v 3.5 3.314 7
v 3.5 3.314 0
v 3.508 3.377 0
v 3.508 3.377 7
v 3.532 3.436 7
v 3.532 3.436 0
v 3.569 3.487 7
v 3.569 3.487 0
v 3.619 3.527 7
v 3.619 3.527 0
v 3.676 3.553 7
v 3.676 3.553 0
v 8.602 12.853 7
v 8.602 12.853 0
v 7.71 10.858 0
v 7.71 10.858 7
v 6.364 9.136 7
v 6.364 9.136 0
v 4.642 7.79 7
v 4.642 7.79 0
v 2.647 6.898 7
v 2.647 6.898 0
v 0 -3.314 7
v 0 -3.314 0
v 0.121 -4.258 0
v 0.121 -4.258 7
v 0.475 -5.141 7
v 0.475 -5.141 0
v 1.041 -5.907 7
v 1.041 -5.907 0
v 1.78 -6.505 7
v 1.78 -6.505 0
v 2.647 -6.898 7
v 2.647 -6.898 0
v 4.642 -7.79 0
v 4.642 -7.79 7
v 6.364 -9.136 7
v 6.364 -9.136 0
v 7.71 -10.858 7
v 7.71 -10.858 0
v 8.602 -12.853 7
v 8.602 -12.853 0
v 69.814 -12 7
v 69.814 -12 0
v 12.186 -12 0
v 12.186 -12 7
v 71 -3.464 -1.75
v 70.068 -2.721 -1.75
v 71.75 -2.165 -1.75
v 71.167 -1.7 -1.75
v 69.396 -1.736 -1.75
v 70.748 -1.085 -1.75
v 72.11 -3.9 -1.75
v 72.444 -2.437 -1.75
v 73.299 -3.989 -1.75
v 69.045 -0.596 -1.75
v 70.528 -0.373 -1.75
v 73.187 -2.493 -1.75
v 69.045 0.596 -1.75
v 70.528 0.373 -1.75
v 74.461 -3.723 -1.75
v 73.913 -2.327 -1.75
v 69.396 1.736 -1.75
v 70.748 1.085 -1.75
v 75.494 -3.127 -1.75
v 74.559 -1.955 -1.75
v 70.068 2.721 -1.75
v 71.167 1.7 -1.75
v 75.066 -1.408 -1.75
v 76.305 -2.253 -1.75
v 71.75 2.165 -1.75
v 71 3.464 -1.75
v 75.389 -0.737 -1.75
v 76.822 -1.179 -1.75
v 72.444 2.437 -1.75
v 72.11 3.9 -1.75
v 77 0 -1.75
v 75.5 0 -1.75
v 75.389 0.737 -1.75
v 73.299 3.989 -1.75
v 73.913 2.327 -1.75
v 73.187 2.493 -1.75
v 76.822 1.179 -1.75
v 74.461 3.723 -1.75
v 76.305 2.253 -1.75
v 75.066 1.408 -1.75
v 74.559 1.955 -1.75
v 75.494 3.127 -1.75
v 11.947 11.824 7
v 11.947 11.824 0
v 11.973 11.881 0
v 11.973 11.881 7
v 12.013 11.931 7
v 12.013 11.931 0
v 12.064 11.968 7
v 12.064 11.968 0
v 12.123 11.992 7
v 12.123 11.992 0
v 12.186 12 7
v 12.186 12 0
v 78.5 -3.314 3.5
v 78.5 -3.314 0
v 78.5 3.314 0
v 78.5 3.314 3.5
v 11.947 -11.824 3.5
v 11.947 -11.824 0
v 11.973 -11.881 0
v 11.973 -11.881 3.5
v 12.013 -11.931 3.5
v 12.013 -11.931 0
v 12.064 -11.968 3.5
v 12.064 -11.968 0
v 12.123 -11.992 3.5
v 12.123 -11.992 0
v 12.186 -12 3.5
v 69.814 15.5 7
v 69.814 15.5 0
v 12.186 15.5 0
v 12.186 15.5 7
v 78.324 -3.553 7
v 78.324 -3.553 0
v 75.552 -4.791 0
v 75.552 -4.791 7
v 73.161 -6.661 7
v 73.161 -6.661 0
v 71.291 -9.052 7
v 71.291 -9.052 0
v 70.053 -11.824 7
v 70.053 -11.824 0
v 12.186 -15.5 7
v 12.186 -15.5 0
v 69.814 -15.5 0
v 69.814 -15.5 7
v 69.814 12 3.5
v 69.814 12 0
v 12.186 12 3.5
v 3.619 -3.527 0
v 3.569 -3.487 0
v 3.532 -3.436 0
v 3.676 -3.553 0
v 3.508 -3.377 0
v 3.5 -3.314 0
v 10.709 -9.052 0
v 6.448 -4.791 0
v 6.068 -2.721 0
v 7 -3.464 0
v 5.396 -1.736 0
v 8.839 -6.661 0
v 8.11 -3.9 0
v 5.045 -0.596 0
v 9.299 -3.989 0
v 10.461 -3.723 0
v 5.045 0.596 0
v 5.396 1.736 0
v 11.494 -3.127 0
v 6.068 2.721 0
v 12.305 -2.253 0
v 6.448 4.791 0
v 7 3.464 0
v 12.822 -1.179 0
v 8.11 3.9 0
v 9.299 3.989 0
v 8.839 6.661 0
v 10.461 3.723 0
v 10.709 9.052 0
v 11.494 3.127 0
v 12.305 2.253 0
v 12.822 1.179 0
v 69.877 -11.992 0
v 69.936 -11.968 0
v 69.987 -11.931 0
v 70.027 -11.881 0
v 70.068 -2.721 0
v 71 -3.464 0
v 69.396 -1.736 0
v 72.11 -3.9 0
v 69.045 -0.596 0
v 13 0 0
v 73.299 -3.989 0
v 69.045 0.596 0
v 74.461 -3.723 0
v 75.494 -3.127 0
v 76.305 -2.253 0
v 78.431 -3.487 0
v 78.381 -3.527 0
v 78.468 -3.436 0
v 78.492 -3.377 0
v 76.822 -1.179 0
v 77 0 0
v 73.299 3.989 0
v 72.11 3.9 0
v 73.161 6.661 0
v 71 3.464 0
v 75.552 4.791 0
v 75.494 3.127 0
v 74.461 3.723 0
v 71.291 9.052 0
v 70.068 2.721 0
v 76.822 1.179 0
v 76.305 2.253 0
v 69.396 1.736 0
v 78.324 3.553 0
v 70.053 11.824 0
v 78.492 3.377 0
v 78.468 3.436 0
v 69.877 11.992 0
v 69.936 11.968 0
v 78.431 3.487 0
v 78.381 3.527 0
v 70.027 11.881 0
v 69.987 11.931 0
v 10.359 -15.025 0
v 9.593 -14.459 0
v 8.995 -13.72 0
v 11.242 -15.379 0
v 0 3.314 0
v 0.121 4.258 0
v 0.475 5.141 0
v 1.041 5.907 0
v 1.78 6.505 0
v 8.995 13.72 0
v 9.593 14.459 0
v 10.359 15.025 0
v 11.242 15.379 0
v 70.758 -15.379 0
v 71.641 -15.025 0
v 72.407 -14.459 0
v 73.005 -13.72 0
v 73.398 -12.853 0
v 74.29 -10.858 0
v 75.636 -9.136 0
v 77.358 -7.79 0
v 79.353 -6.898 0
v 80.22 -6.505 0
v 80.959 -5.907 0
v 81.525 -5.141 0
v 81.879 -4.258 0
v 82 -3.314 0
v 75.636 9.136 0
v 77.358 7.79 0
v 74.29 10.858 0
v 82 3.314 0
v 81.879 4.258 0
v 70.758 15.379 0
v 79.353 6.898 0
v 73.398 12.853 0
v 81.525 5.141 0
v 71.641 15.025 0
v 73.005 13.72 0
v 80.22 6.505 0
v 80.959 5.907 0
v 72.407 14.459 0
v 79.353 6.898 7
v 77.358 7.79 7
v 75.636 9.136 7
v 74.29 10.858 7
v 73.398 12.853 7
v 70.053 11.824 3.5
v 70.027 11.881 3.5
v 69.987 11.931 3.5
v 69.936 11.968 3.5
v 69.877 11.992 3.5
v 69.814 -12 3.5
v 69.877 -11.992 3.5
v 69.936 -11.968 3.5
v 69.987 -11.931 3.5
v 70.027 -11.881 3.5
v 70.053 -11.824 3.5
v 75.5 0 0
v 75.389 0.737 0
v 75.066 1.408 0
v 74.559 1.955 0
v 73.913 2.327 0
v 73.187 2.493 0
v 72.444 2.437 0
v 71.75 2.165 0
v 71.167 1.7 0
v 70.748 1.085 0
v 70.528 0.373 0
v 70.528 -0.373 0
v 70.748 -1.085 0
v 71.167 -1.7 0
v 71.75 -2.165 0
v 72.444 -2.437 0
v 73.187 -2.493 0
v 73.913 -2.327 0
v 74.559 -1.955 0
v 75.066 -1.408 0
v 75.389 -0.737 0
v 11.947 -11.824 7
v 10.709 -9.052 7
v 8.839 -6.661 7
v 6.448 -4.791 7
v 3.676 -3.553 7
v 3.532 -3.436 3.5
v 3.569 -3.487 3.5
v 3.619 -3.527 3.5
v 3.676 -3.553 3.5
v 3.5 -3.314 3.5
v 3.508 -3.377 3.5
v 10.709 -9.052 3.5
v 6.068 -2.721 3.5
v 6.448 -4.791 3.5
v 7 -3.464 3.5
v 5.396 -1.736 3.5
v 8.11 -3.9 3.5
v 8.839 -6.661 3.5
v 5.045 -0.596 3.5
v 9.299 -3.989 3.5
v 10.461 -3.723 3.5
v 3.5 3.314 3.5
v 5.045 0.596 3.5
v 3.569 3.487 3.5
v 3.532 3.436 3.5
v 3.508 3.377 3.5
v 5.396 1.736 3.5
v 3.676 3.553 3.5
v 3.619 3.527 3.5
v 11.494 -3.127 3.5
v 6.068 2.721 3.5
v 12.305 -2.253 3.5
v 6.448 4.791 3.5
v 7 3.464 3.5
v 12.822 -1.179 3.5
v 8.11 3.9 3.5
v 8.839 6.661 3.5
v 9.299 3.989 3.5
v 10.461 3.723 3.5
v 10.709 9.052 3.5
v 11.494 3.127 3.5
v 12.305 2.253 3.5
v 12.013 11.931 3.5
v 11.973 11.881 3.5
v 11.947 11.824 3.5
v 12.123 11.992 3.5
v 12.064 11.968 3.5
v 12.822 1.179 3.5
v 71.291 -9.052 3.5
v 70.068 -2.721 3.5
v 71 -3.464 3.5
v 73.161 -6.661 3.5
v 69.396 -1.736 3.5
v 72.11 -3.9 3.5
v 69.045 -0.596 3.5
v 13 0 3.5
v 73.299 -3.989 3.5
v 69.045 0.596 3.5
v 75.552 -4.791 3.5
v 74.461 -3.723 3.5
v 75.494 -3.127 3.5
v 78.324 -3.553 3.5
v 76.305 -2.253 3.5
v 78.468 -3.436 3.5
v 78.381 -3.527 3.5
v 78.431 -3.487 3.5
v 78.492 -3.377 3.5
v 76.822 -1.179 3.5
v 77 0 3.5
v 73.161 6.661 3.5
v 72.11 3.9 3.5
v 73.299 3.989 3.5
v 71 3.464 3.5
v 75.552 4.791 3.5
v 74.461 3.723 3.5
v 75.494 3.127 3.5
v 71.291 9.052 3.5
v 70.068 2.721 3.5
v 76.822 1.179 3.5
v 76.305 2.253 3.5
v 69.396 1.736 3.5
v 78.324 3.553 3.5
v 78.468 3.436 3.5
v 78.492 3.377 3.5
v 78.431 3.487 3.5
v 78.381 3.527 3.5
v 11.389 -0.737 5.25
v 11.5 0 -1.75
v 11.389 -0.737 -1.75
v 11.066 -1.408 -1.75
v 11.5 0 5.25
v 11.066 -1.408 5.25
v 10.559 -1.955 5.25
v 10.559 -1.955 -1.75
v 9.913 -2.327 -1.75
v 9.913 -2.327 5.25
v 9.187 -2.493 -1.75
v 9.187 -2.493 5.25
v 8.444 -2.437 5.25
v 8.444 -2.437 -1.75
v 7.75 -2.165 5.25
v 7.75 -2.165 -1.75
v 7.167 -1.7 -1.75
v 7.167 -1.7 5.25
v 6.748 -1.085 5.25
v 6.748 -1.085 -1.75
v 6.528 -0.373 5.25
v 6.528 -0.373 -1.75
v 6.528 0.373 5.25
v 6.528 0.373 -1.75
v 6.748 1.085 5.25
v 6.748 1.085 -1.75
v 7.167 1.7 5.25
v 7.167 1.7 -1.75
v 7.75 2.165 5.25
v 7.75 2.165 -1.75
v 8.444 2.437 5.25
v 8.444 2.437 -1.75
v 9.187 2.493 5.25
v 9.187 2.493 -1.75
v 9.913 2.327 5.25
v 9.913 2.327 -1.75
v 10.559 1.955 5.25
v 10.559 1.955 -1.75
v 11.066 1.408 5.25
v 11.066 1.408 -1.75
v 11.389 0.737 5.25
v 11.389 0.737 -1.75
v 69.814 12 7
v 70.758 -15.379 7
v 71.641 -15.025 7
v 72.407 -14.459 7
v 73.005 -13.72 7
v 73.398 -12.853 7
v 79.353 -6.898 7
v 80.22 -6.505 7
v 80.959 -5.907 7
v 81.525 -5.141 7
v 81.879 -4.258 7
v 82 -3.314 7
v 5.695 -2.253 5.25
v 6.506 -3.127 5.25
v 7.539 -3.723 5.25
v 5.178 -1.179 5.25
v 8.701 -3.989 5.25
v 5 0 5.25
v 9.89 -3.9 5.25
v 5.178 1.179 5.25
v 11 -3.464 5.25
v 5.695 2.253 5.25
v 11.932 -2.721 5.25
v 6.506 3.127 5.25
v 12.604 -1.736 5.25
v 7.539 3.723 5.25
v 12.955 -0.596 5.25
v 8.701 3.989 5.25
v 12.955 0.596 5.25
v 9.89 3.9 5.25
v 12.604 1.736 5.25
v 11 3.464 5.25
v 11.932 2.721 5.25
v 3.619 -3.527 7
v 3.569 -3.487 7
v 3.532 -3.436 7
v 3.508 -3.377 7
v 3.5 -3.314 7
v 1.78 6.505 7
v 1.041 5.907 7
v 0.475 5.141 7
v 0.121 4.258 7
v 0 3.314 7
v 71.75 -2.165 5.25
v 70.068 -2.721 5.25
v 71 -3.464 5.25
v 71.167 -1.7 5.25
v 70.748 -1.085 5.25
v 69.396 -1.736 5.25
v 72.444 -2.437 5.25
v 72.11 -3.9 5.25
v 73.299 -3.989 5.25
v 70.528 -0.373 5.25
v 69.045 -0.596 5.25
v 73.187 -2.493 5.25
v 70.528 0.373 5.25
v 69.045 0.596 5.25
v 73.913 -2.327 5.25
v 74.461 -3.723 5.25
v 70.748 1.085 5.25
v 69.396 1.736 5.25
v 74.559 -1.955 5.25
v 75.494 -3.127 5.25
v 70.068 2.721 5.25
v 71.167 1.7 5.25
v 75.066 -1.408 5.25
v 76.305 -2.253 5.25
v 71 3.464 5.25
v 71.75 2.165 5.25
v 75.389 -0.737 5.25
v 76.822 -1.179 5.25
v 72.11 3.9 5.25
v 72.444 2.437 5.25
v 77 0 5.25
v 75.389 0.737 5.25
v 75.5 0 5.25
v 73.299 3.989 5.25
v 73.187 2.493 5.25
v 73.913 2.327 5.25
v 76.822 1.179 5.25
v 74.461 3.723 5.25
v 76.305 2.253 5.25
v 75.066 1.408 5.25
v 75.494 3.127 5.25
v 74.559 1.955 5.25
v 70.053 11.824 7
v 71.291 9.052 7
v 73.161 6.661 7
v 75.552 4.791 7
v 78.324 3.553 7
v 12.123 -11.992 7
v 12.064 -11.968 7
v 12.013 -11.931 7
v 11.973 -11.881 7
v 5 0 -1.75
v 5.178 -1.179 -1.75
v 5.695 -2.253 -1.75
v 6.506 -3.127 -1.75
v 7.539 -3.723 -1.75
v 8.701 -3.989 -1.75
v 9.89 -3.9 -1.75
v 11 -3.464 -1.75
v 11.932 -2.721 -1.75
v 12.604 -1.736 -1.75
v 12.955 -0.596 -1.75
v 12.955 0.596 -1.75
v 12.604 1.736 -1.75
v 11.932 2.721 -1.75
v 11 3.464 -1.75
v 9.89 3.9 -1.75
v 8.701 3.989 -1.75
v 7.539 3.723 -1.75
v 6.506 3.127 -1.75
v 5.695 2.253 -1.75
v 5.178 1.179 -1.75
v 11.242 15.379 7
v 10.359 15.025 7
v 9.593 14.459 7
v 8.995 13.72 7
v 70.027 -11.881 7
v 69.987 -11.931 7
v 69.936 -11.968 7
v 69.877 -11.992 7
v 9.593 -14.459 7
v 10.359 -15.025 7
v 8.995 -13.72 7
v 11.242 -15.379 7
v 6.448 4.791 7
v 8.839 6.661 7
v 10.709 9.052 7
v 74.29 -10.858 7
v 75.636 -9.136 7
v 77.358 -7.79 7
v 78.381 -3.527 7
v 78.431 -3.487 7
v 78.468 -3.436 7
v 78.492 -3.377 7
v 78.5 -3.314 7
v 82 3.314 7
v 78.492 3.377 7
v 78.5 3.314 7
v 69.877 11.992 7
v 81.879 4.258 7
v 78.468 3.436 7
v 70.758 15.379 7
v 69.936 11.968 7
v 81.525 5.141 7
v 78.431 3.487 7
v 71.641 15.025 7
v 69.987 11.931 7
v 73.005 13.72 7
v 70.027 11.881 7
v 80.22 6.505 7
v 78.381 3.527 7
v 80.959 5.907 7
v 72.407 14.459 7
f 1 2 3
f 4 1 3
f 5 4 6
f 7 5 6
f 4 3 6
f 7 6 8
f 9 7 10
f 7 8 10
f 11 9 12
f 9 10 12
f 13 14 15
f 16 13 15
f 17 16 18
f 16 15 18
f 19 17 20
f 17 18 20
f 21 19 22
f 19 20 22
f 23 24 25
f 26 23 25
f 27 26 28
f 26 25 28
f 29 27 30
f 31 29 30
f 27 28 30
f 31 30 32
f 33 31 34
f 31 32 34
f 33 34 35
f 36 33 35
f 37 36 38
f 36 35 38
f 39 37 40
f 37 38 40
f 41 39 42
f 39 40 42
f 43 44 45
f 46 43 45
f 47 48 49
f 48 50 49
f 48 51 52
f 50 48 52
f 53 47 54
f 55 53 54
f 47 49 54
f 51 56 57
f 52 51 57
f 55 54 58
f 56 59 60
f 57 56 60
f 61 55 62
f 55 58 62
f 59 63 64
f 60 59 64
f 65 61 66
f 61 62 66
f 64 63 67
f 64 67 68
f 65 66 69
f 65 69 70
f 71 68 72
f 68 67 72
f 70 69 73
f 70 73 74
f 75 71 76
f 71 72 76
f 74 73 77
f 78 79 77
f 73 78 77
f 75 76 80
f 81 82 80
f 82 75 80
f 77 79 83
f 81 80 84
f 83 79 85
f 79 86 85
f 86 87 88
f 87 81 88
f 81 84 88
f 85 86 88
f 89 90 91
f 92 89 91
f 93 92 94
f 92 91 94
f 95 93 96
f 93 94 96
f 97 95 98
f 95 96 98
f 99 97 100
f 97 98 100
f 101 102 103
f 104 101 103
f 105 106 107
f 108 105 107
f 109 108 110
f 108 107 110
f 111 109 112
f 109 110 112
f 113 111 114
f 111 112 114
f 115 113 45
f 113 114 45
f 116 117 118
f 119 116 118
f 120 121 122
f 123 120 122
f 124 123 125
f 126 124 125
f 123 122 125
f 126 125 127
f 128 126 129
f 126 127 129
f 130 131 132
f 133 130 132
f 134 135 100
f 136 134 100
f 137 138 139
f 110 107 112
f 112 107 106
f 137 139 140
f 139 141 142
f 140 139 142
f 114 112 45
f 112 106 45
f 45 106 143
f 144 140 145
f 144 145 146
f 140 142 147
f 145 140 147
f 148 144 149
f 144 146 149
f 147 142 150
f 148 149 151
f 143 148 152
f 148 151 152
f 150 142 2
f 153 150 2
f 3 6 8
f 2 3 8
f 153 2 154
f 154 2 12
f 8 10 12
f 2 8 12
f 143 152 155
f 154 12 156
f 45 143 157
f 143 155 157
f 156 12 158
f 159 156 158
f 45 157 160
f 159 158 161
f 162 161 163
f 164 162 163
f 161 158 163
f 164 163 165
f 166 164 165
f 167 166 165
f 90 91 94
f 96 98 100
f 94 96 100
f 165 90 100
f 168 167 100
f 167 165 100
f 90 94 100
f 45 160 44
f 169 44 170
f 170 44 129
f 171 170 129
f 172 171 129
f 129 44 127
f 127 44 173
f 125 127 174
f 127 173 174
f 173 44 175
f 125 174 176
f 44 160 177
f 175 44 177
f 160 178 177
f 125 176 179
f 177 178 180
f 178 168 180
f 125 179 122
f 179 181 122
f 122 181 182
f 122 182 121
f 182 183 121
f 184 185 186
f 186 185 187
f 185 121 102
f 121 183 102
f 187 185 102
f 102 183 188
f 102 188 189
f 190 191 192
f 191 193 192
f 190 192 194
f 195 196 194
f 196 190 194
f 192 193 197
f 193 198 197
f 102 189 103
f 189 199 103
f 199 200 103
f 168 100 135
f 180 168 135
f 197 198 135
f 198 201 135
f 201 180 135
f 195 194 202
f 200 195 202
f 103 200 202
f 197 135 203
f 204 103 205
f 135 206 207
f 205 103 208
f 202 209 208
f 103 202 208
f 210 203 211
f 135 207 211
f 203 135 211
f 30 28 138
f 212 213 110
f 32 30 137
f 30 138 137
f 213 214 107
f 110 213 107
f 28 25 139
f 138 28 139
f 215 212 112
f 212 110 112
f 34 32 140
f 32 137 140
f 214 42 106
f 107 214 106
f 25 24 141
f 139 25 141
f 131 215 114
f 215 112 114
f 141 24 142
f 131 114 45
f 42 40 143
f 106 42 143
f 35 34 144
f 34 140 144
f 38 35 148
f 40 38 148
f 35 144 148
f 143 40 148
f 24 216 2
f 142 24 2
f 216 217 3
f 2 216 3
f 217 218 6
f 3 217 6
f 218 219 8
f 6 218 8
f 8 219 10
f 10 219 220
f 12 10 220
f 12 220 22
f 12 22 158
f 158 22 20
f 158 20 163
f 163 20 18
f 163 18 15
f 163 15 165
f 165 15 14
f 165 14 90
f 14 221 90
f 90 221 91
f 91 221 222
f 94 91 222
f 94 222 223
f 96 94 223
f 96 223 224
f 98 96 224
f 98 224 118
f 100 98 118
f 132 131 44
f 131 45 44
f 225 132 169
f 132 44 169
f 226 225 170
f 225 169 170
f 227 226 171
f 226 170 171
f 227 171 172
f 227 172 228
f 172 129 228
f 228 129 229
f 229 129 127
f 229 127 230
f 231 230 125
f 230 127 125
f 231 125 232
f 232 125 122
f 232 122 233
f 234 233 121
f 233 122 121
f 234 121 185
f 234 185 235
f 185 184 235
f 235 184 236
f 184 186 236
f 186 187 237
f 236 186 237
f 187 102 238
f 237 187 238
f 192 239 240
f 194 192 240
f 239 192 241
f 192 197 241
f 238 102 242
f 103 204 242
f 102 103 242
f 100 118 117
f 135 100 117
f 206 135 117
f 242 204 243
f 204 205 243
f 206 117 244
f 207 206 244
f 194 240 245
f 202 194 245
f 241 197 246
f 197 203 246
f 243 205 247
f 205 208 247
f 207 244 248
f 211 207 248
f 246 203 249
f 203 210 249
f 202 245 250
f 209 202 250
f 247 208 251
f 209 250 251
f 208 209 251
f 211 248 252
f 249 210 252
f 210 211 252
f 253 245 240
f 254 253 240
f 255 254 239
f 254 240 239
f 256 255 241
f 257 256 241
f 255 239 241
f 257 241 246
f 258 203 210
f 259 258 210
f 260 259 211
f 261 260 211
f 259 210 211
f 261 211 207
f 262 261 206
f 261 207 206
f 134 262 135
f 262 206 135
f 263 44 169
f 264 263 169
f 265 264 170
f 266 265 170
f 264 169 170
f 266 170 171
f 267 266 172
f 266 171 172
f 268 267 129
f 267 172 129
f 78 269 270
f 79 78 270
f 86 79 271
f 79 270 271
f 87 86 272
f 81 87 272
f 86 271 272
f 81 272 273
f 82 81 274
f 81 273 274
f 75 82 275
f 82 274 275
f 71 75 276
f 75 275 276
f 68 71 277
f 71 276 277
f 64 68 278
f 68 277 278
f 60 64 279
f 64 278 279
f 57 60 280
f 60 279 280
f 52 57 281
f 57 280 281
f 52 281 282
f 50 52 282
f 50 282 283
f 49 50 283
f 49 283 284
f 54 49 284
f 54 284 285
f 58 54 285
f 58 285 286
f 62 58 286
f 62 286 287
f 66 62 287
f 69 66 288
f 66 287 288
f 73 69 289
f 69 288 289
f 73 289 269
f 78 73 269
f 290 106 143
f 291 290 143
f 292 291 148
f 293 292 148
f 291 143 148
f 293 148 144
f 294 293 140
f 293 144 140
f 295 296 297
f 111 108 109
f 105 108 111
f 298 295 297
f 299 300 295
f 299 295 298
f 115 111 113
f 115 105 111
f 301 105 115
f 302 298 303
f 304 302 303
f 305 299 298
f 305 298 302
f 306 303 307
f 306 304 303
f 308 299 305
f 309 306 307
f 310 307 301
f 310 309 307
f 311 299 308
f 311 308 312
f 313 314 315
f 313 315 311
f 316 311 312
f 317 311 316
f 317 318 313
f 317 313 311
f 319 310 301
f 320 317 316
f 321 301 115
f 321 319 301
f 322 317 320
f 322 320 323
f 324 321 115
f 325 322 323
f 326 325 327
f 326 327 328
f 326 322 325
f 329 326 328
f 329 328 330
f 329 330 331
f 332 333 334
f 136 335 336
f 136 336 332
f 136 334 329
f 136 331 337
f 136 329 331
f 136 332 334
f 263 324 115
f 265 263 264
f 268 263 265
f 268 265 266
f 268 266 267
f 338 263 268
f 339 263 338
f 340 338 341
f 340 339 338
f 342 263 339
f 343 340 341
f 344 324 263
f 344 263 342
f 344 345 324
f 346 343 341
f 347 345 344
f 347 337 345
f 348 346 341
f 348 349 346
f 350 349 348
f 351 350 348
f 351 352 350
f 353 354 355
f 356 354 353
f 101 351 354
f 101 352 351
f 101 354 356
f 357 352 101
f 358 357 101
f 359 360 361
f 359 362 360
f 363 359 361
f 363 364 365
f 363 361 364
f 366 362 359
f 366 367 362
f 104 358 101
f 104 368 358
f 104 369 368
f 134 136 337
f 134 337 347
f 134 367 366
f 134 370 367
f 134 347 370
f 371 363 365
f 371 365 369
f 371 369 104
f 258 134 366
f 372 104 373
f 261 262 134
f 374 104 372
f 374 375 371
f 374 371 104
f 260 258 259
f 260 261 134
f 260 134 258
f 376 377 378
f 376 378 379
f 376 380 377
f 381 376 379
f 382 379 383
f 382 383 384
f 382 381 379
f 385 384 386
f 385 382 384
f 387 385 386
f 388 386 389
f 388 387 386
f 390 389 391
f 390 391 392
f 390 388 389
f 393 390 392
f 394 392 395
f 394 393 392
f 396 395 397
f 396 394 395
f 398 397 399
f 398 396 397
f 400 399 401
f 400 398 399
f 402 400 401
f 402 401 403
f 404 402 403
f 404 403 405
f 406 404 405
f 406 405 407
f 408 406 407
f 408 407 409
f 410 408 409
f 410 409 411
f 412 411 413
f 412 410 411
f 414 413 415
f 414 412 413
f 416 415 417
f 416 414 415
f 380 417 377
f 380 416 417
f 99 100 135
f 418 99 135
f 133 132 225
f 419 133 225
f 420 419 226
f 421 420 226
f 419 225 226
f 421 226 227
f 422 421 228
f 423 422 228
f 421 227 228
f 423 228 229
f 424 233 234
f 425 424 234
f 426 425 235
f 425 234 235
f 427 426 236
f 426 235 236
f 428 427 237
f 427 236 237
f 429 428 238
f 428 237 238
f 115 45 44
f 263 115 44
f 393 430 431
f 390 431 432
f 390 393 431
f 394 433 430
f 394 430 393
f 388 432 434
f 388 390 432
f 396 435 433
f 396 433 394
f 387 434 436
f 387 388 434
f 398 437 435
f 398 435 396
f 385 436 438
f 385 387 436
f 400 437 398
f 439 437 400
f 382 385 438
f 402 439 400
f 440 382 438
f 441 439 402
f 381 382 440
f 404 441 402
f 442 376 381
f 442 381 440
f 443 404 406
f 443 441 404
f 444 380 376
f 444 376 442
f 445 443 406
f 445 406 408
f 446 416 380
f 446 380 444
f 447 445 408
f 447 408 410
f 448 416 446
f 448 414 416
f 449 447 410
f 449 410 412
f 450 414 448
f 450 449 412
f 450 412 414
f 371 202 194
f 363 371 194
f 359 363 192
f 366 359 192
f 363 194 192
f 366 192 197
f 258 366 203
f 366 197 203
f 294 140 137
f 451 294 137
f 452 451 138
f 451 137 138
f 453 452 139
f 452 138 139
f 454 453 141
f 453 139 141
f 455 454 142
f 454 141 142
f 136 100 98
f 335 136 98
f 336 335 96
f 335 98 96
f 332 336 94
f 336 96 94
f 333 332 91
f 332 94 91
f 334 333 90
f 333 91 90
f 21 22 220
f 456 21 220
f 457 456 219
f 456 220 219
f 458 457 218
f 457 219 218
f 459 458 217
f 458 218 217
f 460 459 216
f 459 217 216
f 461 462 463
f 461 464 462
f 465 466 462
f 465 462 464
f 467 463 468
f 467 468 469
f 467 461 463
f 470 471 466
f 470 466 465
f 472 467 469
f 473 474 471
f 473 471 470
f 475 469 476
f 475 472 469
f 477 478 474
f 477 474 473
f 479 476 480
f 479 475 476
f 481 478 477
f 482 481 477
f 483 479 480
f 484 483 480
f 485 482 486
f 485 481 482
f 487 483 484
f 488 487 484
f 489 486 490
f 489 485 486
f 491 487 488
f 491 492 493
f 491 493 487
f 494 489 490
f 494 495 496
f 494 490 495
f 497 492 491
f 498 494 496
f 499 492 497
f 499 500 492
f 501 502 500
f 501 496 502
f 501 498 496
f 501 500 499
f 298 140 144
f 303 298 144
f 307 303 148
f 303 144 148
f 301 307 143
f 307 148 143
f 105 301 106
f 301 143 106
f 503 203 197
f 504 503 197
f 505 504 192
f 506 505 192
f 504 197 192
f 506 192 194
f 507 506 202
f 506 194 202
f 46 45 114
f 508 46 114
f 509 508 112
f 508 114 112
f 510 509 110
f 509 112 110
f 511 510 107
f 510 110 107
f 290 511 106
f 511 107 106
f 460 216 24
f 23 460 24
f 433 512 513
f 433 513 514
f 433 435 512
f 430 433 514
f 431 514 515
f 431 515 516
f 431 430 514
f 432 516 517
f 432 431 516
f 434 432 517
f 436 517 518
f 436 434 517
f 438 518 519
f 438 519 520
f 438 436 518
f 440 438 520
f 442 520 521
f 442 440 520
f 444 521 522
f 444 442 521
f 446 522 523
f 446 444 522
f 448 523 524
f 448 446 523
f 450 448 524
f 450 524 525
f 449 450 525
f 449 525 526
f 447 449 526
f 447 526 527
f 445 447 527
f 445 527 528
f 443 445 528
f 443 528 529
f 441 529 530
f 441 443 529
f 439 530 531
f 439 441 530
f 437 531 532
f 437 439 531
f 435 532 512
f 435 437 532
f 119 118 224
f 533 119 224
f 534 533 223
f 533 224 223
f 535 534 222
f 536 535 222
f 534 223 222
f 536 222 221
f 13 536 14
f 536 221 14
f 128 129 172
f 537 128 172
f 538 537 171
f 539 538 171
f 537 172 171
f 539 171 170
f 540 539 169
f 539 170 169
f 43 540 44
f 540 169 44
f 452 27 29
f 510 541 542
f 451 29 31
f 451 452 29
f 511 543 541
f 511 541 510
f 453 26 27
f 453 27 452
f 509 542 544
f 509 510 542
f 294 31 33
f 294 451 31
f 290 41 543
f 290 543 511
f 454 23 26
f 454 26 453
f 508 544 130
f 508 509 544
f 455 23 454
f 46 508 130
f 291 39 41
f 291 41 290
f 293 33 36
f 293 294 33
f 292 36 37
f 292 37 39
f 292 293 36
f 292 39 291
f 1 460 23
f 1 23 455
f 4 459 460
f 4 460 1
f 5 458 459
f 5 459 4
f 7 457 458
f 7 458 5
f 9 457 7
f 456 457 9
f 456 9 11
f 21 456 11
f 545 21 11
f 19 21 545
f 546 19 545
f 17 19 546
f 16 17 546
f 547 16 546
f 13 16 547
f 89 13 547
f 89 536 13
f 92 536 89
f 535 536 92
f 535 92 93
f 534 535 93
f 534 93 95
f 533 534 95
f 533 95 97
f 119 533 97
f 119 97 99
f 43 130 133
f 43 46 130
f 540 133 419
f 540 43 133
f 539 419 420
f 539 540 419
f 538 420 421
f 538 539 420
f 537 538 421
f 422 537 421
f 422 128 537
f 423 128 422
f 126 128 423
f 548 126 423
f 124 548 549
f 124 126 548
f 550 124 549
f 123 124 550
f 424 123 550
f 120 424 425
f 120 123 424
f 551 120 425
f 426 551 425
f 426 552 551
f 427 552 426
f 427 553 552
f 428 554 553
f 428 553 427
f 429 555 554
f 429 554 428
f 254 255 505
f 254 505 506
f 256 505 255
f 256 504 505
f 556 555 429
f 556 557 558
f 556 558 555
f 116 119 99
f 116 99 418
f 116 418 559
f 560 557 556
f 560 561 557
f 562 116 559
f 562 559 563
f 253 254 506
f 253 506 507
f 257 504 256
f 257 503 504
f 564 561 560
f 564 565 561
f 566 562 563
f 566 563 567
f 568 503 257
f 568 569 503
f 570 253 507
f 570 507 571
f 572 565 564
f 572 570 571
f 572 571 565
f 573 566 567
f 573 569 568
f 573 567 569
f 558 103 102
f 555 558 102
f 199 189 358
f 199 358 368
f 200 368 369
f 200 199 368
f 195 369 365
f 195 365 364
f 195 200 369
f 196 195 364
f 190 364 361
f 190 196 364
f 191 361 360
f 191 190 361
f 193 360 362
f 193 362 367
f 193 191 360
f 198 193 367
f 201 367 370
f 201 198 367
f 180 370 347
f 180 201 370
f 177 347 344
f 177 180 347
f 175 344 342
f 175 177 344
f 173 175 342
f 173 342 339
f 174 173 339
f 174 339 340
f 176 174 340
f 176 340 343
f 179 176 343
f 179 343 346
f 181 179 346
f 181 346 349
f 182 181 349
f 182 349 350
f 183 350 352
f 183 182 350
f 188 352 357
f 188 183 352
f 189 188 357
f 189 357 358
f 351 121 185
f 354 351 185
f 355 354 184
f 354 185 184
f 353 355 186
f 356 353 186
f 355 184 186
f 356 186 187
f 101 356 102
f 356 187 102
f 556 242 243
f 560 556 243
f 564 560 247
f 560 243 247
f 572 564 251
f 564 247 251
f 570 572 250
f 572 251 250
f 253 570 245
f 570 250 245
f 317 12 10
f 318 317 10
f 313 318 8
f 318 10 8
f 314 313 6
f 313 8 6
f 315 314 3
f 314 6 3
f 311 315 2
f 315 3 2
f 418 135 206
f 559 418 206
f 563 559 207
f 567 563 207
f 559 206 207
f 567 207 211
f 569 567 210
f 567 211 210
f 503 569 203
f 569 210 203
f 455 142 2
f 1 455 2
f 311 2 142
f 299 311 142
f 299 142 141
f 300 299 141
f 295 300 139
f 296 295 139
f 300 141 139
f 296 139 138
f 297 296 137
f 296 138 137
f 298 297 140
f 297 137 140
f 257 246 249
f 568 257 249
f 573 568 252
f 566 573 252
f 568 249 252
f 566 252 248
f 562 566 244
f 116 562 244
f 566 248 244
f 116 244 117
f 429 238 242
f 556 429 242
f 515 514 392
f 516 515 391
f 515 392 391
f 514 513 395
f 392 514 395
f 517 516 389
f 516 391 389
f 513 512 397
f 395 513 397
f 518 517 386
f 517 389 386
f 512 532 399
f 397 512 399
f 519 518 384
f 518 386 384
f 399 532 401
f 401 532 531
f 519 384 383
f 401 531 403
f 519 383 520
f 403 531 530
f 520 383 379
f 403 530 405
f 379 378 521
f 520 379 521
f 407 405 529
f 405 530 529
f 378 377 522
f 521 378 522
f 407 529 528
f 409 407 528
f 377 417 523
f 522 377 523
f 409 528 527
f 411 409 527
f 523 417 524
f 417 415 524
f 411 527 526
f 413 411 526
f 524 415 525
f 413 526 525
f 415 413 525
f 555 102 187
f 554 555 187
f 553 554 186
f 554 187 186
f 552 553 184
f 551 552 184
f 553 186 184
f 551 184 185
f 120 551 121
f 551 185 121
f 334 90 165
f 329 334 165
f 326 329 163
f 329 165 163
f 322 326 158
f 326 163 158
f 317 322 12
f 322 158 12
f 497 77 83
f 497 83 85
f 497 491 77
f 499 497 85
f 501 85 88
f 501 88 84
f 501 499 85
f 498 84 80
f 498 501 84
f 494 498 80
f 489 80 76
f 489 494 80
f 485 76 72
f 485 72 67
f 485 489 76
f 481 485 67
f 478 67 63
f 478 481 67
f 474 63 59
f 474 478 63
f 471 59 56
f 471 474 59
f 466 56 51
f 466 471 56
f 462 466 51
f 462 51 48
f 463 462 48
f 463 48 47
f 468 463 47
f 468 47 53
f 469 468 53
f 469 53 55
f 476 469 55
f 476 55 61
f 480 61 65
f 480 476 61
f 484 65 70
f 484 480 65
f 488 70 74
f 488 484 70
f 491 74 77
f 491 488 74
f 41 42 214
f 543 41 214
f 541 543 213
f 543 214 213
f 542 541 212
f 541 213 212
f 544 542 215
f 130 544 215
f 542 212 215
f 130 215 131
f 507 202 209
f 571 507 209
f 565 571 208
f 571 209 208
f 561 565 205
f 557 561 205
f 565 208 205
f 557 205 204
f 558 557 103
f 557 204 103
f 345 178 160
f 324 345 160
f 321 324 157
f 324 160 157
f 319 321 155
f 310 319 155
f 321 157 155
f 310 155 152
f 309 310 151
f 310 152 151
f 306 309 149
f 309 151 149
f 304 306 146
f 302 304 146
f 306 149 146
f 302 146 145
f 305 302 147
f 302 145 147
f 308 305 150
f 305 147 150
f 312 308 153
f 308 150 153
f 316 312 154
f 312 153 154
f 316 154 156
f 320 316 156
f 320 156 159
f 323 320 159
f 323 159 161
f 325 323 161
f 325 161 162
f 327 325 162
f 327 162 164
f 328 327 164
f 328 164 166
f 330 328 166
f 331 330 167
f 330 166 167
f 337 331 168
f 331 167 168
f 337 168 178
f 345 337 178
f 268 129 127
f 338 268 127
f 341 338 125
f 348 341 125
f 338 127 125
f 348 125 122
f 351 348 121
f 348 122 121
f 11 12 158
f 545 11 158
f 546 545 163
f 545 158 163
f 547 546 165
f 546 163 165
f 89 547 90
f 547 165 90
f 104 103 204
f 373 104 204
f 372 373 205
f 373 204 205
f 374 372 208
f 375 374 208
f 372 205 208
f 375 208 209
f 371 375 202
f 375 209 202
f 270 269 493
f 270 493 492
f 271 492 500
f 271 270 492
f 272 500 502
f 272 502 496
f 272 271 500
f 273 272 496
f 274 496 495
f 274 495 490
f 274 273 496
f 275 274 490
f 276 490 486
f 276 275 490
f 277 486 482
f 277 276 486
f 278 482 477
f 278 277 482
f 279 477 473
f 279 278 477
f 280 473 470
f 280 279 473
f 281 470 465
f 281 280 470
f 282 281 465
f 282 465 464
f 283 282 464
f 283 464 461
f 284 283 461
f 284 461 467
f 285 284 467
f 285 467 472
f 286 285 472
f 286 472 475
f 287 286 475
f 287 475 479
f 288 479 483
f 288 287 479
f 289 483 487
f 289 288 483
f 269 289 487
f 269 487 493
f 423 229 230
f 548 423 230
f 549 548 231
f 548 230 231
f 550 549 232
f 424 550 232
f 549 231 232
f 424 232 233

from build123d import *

# Parameters (mm, degrees)
BOSS_EXTRUDE3_DEPTH        = 5.25
BOSS_EXTRUDE3_DEPTH_BACK   = 1.75
SKETCH8_R                  = 4
SKETCH8_R_2                = 2.5
BOSS_EXTRUDE3_2_DEPTH      = 5.25
BOSS_EXTRUDE3_2_DEPTH_BACK = 1.75
SKETCH8_4_R                = 4
BOSS_EXTRUDE4_DEPTH        = 3.5
BOSS_EXTRUDE5_DEPTH        = 7


with BuildPart() as part:
    # Sketch8 → Boss-Extrude3 (new, two sides: drawn at the far end of the back side and taken through both)
    with BuildSketch(Plane.XY.offset(-BOSS_EXTRUDE3_DEPTH_BACK)):
        with Locations((9, 0)):
            Circle(SKETCH8_R)
        with Locations((9, 0)):
            Circle(SKETCH8_R_2, mode=Mode.SUBTRACT)
    extrude(amount=BOSS_EXTRUDE3_DEPTH + BOSS_EXTRUDE3_DEPTH_BACK)


with BuildPart() as body_2:
    # Sketch8 → Boss-Extrude3 2 (new, two sides: drawn at the far end of the back side and taken through both)
    with BuildSketch(Plane.XY.offset(-BOSS_EXTRUDE3_2_DEPTH_BACK)):
        with Locations((73, 0)):
            Circle(SKETCH8_R)
        with Locations((73, 0)):
            Circle(SKETCH8_R_2, mode=Mode.SUBTRACT)
    extrude(amount=BOSS_EXTRUDE3_2_DEPTH + BOSS_EXTRUDE3_2_DEPTH_BACK)


with BuildPart() as body_3:
    # Sketch8<4> → Boss-Extrude4 (new body)
    with BuildSketch(Plane.XY):
        with BuildLine():
            Line((3.5, 3.313942393), (3.5, -3.313942393))
            ThreePointArc((3.5, -3.313942393), (3.548900083, -3.462464524), (3.676470588, -3.552884699))
            ThreePointArc((3.676470588, -3.552884699), (8.838834765, -6.661165235), (11.947115301, -11.823529412))
            ThreePointArc((11.947115301, -11.823529412), (12.037535476, -11.951099917), (12.186057607, -12))
            Line((12.186057607, -12), (69.813942393, -12))
            ThreePointArc((69.813942393, -12), (69.962464524, -11.951099917), (70.052884699, -11.823529412))
            ThreePointArc((70.052884699, -11.823529412), (73.161165235, -6.661165235), (78.323529412, -3.552884699))
            ThreePointArc((78.323529412, -3.552884699), (78.451099917, -3.462464524), (78.5, -3.313942393))
            Line((78.5, -3.313942393), (78.5, 3.313942393))
            ThreePointArc((78.5, 3.313942393), (78.451099917, 3.462464524), (78.323529412, 3.552884699))
            ThreePointArc((78.323529412, 3.552884699), (73.161165235, 6.661165235), (70.052884699, 11.823529412))
            ThreePointArc((70.052884699, 11.823529412), (69.962464524, 11.951099917), (69.813942393, 12))
            Line((69.813942393, 12), (12.186057607, 12))
            ThreePointArc((12.186057607, 12), (12.037535476, 11.951099917), (11.947115301, 11.823529412))
            ThreePointArc((11.947115301, 11.823529412), (8.838834765, 6.661165235), (3.676470588, 3.552884699))
            ThreePointArc((3.676470588, 3.552884699), (3.548900083, 3.462464524), (3.5, 3.313942393))
        make_face()
        with Locations((9, 0)):
            Circle(SKETCH8_4_R, mode=Mode.SUBTRACT)
        with Locations((73, 0)):
            Circle(SKETCH8_4_R, mode=Mode.SUBTRACT)
    extrude(amount=BOSS_EXTRUDE4_DEPTH)


with BuildPart() as body_4:
    # Sketch8<6> → Boss-Extrude5 (new body)
    with BuildSketch(Plane.XY):
        with BuildLine():
            ThreePointArc((0, -3.313942393), (0.73350125, -5.541774365), (2.647058824, -6.898076983))
            ThreePointArc((2.647058824, -6.898076983), (6.363961031, -9.136038969), (8.601923017, -12.852941176))
            ThreePointArc((8.601923017, -12.852941176), (9.958225635, -14.76649875), (12.186057607, -15.5))
            Line((12.186057607, -15.5), (69.813942393, -15.5))
            ThreePointArc((69.813942393, -15.5), (72.041774365, -14.76649875), (73.398076983, -12.852941176))
            ThreePointArc((73.398076983, -12.852941176), (75.636038969, -9.136038969), (79.352941176, -6.898076983))
            ThreePointArc((79.352941176, -6.898076983), (81.26649875, -5.541774365), (82, -3.313942393))
            Line((82, -3.313942393), (82, 3.313942393))
            ThreePointArc((82, 3.313942393), (81.26649875, 5.541774365), (79.352941176, 6.898076983))
            ThreePointArc((79.352941176, 6.898076983), (75.636038969, 9.136038969), (73.398076983, 12.852941176))
            ThreePointArc((73.398076983, 12.852941176), (72.041774365, 14.76649875), (69.813942393, 15.5))
            Line((69.813942393, 15.5), (12.186057607, 15.5))
            ThreePointArc((12.186057607, 15.5), (9.958225635, 14.76649875), (8.601923017, 12.852941176))
            ThreePointArc((8.601923017, 12.852941176), (6.363961031, 9.136038969), (2.647058824, 6.898076983))
            ThreePointArc((2.647058824, 6.898076983), (0.73350125, 5.541774365), (0, 3.313942393))
            Line((0, 3.313942393), (0, -3.313942393))
        make_face()
        with BuildLine():
            Line((3.5, -3.313942393), (3.5, 3.313942393))
            ThreePointArc((3.5, 3.313942393), (3.548900083, 3.462464524), (3.676470588, 3.552884699))
            ThreePointArc((3.676470588, 3.552884699), (8.838834765, 6.661165235), (11.947115301, 11.823529412))
            ThreePointArc((11.947115301, 11.823529412), (12.037535476, 11.951099917), (12.186057607, 12))
            Line((12.186057607, 12), (69.813942393, 12))
            ThreePointArc((69.813942393, 12), (69.962464524, 11.951099917), (70.052884699, 11.823529412))
            ThreePointArc((70.052884699, 11.823529412), (73.161165235, 6.661165235), (78.323529412, 3.552884699))
            ThreePointArc((78.323529412, 3.552884699), (78.451099917, 3.462464524), (78.5, 3.313942393))
            Line((78.5, 3.313942393), (78.5, -3.313942393))
            ThreePointArc((78.5, -3.313942393), (78.451099917, -3.462464524), (78.323529412, -3.552884699))
            ThreePointArc((78.323529412, -3.552884699), (73.161165235, -6.661165235), (70.052884699, -11.823529412))
            ThreePointArc((70.052884699, -11.823529412), (69.962464524, -11.951099917), (69.813942393, -12))
            Line((69.813942393, -12), (12.186057607, -12))
            ThreePointArc((12.186057607, -12), (12.037535476, -11.951099917), (11.947115301, -11.823529412))
            ThreePointArc((11.947115301, -11.823529412), (8.838834765, -6.661165235), (3.676470588, -3.552884699))
            ThreePointArc((3.676470588, -3.552884699), (3.548900083, -3.462464524), (3.5, -3.313942393))
        make_face(mode=Mode.SUBTRACT)
    extrude(amount=BOSS_EXTRUDE5_DEPTH)


solid = Compound([part.part, body_2.part, body_3.part, body_4.part])
